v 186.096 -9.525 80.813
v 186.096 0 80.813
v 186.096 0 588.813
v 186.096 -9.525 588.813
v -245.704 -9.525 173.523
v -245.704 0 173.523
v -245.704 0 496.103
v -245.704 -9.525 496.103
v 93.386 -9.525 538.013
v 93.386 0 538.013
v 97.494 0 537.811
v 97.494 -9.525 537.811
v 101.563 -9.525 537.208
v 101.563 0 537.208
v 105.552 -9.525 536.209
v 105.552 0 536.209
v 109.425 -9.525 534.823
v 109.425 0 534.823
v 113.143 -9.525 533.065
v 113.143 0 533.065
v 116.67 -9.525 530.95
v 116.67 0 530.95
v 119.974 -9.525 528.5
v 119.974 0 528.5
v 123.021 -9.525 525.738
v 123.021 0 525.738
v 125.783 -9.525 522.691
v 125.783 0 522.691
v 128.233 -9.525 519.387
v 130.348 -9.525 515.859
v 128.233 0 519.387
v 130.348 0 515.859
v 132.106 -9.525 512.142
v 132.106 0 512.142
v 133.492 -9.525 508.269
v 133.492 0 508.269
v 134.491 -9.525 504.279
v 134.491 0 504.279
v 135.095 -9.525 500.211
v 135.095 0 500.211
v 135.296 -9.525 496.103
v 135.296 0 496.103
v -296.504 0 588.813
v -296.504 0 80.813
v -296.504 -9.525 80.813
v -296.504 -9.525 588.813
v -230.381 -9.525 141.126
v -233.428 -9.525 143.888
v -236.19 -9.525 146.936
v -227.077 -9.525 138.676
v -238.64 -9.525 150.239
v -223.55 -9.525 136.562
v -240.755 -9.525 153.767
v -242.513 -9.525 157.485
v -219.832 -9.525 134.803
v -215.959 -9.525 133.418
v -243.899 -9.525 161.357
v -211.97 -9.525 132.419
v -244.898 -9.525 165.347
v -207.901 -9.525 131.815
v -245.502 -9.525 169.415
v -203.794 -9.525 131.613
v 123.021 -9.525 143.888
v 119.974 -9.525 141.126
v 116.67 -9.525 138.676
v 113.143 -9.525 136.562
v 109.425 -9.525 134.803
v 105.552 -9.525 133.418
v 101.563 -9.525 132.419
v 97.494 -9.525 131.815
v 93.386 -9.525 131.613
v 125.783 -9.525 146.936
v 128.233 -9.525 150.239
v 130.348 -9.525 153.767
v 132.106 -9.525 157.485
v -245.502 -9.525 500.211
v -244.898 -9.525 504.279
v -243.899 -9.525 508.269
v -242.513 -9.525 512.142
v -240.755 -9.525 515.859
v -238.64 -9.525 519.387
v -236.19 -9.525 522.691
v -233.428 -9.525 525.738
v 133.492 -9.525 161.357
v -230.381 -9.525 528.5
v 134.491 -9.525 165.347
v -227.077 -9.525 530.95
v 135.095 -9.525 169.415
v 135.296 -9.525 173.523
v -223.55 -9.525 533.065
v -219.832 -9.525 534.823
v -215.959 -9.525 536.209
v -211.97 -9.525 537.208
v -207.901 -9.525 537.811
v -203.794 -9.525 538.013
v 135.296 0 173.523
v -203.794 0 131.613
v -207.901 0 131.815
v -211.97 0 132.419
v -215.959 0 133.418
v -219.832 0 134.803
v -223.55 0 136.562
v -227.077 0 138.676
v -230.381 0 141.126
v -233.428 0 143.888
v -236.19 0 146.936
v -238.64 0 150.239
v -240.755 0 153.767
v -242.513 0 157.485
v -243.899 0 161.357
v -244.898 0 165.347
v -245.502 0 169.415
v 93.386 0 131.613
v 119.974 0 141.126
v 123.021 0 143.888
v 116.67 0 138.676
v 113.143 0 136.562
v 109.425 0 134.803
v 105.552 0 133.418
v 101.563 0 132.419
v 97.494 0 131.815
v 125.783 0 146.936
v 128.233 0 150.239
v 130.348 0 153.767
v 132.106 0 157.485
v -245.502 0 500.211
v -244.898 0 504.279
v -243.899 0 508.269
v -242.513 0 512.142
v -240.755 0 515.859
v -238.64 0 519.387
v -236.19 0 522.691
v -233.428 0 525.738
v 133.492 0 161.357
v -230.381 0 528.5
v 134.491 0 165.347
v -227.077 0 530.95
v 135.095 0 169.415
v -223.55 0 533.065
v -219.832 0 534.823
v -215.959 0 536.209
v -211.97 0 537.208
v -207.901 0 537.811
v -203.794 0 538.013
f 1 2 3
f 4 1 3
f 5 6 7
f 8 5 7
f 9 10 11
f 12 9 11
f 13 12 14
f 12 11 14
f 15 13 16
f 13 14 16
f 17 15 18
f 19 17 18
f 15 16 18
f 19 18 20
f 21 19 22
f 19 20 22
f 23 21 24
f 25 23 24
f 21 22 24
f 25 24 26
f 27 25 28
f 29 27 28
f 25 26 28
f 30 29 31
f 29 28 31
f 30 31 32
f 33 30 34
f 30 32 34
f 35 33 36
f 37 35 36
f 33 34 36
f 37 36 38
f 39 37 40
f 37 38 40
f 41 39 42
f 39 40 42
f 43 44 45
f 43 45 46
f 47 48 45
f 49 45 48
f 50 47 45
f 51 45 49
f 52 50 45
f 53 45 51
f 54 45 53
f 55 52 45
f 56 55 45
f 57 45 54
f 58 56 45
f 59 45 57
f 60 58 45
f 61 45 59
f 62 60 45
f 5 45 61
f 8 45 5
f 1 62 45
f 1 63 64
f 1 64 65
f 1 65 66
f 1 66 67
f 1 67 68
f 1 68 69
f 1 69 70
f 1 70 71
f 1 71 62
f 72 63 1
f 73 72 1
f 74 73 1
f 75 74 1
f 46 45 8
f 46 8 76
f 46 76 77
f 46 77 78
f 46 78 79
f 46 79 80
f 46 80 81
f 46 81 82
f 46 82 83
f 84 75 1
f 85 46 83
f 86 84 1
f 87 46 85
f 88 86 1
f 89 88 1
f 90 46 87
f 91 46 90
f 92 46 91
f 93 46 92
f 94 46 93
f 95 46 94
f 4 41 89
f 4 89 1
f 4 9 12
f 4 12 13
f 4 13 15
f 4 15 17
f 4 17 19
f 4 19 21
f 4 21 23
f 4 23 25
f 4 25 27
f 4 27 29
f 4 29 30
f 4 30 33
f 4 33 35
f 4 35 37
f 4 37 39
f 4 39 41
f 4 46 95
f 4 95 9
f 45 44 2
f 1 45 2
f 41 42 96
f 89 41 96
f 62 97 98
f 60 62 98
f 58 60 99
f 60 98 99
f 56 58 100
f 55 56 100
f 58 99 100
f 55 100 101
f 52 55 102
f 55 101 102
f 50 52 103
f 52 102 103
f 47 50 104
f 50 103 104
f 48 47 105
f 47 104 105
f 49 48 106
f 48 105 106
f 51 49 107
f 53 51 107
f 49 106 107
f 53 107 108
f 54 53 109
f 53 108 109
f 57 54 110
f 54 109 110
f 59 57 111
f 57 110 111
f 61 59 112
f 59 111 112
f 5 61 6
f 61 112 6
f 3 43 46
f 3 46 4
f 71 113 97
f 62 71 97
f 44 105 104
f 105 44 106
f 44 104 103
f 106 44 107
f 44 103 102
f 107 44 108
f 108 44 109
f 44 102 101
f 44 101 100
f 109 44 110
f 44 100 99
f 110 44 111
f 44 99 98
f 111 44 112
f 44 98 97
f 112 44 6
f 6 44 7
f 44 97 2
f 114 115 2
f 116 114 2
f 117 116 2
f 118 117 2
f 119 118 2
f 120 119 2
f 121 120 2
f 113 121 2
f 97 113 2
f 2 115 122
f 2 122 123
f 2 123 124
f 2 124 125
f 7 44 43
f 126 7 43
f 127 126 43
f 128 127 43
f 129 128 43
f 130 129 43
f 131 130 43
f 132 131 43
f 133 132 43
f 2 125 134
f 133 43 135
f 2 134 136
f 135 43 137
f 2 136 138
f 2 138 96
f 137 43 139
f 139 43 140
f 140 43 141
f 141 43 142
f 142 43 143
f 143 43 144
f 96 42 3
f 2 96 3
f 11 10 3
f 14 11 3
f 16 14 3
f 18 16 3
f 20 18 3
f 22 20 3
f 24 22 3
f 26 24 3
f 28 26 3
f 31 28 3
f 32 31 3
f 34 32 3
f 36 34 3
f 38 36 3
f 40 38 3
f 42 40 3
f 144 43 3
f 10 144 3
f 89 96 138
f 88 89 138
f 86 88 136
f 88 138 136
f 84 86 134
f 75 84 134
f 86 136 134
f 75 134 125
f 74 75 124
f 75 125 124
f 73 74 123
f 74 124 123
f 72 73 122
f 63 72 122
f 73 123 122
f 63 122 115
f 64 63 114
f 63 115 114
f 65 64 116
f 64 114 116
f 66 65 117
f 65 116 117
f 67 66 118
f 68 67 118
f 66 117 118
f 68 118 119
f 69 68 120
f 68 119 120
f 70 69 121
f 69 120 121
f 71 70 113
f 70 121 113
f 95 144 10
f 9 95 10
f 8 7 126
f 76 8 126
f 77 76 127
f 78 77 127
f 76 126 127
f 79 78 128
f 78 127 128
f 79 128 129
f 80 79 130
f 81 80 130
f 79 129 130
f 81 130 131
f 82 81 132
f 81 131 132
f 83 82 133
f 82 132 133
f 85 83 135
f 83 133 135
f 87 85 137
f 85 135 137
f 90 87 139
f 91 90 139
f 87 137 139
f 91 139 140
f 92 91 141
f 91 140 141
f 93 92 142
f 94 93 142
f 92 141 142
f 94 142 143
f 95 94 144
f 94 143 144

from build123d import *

# Parameters (mm, degrees)
F0_W     = 482.6
F0_H     = 508
F1_DEPTH = 9.525


with BuildPart() as f1:
    # F0 (on Front) → F1 (new body)
    with BuildSketch(Plane.XZ):
        with Locations((-55.20353, 334.813255)):
            Rectangle(F0_W, F0_H)
        with BuildLine():
            ThreePointArc((135.29647, 173.523255), (123.021315, 143.888409), (93.38647, 131.613255))
            Line((93.38647, 131.613255), (-203.79353, 131.613255))
            ThreePointArc((-203.79353, 131.613255), (-233.428375, 143.888409), (-245.70353, 173.523255))
            Line((-245.70353, 173.523255), (-245.70353, 496.103255))
            ThreePointArc((-245.70353, 496.103255), (-233.428375, 525.7381), (-203.79353, 538.013255))
            Line((-203.79353, 538.013255), (93.38647, 538.013255))
            ThreePointArc((93.38647, 538.013255), (123.021315, 525.7381), (135.29647, 496.103255))
            Line((135.29647, 496.103255), (135.29647, 173.523255))
        make_face(mode=Mode.SUBTRACT)
    extrude(amount=F1_DEPTH)


with BuildPart() as f2_1:
    # F2: copy of F1
    add(f1.part.moved(Location((0, 482.6, 0))))


solid = f1.part
